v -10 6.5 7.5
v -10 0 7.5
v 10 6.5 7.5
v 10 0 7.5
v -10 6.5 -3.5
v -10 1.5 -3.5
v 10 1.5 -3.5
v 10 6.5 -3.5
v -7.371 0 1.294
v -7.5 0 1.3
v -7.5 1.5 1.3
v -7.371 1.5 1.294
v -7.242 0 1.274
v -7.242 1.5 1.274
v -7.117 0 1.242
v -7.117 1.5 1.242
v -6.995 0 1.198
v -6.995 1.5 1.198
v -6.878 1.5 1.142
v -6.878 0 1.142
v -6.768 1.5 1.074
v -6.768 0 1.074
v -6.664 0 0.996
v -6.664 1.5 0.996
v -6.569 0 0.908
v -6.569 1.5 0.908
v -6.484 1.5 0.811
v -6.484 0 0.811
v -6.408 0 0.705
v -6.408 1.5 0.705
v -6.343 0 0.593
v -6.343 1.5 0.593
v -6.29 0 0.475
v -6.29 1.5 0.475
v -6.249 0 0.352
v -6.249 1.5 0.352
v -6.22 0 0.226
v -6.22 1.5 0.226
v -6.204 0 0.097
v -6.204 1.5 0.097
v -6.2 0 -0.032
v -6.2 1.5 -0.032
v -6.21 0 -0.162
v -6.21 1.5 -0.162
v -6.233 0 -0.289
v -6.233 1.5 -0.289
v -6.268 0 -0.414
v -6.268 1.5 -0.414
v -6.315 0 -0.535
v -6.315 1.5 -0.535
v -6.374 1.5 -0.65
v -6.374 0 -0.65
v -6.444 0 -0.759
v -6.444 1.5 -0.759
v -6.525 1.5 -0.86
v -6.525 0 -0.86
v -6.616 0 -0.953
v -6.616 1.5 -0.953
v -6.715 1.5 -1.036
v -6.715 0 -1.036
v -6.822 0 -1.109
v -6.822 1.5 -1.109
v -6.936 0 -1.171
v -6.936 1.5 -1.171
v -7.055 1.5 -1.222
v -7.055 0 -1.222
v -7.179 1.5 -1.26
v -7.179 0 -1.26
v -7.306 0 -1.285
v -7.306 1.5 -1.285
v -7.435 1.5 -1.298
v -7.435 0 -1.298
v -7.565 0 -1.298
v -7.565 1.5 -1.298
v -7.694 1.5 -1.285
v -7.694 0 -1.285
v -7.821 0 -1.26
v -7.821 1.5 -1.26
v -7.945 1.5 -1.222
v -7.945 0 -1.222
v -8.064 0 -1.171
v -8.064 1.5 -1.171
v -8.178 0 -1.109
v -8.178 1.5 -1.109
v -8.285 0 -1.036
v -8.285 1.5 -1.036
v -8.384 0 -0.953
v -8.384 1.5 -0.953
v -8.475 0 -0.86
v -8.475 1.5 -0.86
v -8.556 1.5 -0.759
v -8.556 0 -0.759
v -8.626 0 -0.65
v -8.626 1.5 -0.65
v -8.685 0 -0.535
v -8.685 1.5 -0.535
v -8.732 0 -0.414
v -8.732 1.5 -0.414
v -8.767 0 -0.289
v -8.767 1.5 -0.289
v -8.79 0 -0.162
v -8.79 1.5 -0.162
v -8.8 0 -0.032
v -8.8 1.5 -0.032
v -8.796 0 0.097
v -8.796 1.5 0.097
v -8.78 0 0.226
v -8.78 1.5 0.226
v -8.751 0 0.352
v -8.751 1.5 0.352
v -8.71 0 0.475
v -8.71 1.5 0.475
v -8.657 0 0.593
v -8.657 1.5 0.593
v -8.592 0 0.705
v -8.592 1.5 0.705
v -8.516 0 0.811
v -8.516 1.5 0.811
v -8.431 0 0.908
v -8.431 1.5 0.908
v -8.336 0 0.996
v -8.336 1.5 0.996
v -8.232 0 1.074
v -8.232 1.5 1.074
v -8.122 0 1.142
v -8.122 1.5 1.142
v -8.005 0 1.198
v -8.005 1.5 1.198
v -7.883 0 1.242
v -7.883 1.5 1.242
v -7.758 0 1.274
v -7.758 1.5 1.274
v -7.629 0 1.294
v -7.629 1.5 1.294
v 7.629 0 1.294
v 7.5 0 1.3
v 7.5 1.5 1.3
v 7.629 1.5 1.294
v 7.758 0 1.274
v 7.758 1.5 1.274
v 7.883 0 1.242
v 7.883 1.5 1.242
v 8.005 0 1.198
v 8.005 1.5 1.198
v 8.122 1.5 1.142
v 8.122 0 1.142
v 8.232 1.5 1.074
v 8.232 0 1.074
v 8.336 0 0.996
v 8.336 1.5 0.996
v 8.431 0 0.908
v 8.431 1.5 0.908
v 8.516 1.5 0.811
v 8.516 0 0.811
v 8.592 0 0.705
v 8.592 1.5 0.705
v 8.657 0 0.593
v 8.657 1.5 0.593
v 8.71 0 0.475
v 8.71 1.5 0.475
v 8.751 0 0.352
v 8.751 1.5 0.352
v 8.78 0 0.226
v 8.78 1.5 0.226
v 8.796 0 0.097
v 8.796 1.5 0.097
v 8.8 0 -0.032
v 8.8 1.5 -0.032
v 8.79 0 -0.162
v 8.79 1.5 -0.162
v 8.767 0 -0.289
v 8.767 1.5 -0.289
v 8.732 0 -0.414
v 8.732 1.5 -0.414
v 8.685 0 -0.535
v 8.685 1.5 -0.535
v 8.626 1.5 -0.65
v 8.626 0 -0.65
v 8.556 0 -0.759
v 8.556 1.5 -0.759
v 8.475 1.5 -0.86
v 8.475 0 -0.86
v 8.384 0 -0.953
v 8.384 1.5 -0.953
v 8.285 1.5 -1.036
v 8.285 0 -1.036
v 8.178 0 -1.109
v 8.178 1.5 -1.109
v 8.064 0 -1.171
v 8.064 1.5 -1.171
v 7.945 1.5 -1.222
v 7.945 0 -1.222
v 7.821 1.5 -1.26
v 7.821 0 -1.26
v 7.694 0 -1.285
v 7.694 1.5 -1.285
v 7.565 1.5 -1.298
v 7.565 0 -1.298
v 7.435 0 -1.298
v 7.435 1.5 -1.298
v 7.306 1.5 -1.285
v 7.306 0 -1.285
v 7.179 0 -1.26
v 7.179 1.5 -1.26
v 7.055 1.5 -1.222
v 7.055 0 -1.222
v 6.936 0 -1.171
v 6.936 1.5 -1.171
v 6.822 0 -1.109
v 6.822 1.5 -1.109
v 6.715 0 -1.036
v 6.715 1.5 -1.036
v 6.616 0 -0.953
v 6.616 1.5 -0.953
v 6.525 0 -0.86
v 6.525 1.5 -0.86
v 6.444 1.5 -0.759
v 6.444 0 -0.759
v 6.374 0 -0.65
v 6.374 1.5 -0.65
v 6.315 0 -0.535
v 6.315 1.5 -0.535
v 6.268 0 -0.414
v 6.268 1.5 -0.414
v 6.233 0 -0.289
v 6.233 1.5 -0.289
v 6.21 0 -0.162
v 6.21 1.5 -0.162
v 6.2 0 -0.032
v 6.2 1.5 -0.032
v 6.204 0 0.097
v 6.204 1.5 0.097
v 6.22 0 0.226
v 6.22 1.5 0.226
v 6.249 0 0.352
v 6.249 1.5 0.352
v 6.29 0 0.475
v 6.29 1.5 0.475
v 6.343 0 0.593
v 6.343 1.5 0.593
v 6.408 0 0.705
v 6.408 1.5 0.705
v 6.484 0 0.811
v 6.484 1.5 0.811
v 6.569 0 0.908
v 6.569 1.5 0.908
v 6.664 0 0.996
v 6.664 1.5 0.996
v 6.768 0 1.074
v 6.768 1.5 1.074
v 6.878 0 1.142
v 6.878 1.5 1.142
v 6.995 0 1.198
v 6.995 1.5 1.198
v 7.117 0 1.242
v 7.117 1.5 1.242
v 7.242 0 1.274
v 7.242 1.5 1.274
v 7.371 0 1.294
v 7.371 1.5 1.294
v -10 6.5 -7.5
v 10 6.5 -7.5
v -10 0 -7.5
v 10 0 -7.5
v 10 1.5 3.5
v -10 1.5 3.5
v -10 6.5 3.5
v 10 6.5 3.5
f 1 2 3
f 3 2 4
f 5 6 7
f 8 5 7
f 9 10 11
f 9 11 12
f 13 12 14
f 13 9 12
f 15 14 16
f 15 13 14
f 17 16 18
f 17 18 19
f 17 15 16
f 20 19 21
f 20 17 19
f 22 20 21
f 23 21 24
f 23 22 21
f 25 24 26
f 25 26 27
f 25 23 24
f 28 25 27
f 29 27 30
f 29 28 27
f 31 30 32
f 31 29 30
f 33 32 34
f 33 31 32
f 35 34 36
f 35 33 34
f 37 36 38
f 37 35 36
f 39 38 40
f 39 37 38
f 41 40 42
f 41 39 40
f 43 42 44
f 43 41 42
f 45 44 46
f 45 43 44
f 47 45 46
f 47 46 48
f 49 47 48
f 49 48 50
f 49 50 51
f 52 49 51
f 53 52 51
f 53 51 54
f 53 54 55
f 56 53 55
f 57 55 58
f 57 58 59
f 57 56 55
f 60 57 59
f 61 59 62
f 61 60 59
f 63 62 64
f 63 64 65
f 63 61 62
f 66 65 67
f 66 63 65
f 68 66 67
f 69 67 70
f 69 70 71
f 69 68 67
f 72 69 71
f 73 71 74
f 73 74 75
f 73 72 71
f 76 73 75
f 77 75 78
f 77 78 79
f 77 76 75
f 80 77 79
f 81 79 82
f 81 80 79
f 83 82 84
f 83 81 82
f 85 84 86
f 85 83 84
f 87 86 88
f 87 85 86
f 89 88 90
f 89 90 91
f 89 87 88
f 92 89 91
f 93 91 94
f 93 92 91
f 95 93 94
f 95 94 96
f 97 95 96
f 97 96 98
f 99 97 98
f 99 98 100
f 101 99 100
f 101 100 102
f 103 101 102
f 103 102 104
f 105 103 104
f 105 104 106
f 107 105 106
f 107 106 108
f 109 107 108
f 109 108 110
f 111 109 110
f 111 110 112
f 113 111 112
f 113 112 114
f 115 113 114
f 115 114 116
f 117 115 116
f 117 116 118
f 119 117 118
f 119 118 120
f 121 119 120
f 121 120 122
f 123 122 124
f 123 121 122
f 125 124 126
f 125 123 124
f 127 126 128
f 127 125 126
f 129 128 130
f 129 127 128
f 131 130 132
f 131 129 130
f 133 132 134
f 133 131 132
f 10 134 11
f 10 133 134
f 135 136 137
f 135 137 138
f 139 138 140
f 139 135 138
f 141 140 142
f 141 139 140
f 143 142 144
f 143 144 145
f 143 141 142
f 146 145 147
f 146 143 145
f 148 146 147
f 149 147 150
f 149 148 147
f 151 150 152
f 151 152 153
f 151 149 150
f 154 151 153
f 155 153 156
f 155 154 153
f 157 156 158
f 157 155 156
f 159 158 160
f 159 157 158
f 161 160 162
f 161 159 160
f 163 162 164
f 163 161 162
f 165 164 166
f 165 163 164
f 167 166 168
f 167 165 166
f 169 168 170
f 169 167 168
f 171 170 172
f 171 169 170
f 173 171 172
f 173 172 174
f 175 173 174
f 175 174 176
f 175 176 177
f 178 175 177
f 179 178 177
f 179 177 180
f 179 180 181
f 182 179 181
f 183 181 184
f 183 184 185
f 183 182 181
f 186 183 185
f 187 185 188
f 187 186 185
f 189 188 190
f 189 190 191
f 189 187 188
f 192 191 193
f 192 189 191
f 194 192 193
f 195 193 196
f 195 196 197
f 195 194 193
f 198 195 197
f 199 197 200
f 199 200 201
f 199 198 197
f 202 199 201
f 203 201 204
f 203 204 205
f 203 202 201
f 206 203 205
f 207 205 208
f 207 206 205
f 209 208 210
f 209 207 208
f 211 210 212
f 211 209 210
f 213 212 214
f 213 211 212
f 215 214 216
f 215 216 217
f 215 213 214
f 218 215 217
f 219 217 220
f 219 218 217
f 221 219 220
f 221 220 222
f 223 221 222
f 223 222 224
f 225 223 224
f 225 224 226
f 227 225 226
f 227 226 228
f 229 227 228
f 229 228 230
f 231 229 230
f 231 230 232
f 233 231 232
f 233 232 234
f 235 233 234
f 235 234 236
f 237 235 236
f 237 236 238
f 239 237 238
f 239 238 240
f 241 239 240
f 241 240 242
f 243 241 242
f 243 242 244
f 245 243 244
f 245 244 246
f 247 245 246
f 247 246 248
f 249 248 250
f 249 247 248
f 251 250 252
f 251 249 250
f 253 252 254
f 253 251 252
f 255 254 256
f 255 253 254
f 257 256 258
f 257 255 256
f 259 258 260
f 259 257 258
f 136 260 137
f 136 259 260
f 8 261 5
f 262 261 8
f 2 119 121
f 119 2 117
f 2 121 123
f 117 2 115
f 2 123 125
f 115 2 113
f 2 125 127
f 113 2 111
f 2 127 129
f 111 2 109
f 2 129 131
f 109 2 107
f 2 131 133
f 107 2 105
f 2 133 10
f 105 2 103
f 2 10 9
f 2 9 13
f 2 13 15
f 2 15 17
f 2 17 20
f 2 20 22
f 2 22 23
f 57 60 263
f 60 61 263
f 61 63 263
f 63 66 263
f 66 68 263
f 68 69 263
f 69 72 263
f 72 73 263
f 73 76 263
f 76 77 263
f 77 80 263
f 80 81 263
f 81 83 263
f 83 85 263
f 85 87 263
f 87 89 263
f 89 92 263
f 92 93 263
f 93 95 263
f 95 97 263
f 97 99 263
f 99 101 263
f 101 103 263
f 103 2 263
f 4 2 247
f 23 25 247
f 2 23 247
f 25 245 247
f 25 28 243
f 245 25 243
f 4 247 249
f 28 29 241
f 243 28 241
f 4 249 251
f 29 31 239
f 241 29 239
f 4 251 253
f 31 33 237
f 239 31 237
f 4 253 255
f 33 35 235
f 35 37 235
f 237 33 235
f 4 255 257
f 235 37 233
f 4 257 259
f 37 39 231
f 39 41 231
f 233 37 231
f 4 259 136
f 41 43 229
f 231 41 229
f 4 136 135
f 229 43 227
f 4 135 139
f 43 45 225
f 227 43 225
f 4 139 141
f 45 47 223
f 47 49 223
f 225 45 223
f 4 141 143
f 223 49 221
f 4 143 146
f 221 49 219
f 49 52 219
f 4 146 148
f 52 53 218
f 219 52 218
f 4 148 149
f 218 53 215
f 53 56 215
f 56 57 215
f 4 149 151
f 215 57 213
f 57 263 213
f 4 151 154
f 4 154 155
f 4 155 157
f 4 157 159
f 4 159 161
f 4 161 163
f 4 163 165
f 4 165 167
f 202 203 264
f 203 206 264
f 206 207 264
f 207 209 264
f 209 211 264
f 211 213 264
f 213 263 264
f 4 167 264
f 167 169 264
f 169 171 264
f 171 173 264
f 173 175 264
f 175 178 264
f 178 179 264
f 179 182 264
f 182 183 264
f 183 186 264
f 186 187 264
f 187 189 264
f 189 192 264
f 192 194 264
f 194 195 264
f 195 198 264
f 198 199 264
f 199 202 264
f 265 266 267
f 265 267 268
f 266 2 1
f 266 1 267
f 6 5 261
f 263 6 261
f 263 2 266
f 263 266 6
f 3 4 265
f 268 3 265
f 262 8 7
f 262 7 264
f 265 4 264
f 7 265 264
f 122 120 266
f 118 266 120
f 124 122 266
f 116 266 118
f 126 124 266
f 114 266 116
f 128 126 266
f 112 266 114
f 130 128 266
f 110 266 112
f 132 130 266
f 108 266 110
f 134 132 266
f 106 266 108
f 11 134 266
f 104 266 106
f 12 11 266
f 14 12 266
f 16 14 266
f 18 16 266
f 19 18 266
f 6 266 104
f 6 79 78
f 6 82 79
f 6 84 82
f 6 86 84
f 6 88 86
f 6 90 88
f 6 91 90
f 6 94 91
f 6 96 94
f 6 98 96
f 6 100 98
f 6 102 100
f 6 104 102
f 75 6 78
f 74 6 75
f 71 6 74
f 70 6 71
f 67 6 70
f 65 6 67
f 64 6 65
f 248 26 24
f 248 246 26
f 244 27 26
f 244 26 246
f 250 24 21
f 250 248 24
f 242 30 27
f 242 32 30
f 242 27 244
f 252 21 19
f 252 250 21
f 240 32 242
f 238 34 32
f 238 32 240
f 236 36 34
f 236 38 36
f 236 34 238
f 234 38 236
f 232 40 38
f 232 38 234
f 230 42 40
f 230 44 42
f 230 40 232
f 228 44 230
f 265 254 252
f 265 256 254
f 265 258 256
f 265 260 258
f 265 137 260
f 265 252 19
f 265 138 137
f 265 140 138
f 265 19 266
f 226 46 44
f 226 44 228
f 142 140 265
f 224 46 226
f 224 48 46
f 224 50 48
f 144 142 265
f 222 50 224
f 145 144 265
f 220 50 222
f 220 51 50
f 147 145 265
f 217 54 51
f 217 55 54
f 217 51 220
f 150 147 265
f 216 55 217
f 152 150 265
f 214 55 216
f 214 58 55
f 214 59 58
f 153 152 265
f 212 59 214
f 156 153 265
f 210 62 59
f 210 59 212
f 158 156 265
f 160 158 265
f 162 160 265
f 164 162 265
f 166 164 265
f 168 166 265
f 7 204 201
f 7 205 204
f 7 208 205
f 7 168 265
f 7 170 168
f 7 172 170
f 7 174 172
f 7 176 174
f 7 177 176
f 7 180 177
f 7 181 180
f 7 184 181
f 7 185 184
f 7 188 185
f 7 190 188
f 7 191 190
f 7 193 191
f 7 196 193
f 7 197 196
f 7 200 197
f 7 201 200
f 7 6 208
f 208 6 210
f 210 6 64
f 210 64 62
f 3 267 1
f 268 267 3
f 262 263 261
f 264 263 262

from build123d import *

# Parameters (mm, degrees)
SKETCH_1_W      = 20
SKETCH_1_H      = 15
SKETCH_1_R      = 1.3
EXTRUDE_1_DEPTH = 1.5
SKETCH_2_W      = 20
SKETCH_2_H      = 4
EXTRUDE_2_DEPTH = 5


with BuildPart() as part:
    # 草图1 → 凸台-拉伸1 (new body)
    with BuildSketch(Plane(origin=(0, 0, 0), x_dir=(1, 0, 0), z_dir=(0, 1, 0))):
        Rectangle(SKETCH_1_W, SKETCH_1_H)
        with Locations(Location((7.5, 0, 0), (0, 0, 270))):
            Circle(SKETCH_1_R, mode=Mode.SUBTRACT)
        with Locations(Location((-7.5, 0, 0), (0, 0, 270))):
            Circle(SKETCH_1_R, mode=Mode.SUBTRACT)
    extrude(amount=EXTRUDE_1_DEPTH)

    # 草图2 → 凸台-拉伸2 (add)
    with BuildSketch(Plane(origin=(0, 1.5, 0), x_dir=(1, 0, 0), z_dir=(0, 1, 0))):
        with Locations((0, 5.5)):
            Rectangle(SKETCH_2_W, SKETCH_2_H)
        with Locations((0, -5.5)):
            Rectangle(SKETCH_2_W, SKETCH_2_H)
    extrude(amount=EXTRUDE_2_DEPTH)


solid = part.part
